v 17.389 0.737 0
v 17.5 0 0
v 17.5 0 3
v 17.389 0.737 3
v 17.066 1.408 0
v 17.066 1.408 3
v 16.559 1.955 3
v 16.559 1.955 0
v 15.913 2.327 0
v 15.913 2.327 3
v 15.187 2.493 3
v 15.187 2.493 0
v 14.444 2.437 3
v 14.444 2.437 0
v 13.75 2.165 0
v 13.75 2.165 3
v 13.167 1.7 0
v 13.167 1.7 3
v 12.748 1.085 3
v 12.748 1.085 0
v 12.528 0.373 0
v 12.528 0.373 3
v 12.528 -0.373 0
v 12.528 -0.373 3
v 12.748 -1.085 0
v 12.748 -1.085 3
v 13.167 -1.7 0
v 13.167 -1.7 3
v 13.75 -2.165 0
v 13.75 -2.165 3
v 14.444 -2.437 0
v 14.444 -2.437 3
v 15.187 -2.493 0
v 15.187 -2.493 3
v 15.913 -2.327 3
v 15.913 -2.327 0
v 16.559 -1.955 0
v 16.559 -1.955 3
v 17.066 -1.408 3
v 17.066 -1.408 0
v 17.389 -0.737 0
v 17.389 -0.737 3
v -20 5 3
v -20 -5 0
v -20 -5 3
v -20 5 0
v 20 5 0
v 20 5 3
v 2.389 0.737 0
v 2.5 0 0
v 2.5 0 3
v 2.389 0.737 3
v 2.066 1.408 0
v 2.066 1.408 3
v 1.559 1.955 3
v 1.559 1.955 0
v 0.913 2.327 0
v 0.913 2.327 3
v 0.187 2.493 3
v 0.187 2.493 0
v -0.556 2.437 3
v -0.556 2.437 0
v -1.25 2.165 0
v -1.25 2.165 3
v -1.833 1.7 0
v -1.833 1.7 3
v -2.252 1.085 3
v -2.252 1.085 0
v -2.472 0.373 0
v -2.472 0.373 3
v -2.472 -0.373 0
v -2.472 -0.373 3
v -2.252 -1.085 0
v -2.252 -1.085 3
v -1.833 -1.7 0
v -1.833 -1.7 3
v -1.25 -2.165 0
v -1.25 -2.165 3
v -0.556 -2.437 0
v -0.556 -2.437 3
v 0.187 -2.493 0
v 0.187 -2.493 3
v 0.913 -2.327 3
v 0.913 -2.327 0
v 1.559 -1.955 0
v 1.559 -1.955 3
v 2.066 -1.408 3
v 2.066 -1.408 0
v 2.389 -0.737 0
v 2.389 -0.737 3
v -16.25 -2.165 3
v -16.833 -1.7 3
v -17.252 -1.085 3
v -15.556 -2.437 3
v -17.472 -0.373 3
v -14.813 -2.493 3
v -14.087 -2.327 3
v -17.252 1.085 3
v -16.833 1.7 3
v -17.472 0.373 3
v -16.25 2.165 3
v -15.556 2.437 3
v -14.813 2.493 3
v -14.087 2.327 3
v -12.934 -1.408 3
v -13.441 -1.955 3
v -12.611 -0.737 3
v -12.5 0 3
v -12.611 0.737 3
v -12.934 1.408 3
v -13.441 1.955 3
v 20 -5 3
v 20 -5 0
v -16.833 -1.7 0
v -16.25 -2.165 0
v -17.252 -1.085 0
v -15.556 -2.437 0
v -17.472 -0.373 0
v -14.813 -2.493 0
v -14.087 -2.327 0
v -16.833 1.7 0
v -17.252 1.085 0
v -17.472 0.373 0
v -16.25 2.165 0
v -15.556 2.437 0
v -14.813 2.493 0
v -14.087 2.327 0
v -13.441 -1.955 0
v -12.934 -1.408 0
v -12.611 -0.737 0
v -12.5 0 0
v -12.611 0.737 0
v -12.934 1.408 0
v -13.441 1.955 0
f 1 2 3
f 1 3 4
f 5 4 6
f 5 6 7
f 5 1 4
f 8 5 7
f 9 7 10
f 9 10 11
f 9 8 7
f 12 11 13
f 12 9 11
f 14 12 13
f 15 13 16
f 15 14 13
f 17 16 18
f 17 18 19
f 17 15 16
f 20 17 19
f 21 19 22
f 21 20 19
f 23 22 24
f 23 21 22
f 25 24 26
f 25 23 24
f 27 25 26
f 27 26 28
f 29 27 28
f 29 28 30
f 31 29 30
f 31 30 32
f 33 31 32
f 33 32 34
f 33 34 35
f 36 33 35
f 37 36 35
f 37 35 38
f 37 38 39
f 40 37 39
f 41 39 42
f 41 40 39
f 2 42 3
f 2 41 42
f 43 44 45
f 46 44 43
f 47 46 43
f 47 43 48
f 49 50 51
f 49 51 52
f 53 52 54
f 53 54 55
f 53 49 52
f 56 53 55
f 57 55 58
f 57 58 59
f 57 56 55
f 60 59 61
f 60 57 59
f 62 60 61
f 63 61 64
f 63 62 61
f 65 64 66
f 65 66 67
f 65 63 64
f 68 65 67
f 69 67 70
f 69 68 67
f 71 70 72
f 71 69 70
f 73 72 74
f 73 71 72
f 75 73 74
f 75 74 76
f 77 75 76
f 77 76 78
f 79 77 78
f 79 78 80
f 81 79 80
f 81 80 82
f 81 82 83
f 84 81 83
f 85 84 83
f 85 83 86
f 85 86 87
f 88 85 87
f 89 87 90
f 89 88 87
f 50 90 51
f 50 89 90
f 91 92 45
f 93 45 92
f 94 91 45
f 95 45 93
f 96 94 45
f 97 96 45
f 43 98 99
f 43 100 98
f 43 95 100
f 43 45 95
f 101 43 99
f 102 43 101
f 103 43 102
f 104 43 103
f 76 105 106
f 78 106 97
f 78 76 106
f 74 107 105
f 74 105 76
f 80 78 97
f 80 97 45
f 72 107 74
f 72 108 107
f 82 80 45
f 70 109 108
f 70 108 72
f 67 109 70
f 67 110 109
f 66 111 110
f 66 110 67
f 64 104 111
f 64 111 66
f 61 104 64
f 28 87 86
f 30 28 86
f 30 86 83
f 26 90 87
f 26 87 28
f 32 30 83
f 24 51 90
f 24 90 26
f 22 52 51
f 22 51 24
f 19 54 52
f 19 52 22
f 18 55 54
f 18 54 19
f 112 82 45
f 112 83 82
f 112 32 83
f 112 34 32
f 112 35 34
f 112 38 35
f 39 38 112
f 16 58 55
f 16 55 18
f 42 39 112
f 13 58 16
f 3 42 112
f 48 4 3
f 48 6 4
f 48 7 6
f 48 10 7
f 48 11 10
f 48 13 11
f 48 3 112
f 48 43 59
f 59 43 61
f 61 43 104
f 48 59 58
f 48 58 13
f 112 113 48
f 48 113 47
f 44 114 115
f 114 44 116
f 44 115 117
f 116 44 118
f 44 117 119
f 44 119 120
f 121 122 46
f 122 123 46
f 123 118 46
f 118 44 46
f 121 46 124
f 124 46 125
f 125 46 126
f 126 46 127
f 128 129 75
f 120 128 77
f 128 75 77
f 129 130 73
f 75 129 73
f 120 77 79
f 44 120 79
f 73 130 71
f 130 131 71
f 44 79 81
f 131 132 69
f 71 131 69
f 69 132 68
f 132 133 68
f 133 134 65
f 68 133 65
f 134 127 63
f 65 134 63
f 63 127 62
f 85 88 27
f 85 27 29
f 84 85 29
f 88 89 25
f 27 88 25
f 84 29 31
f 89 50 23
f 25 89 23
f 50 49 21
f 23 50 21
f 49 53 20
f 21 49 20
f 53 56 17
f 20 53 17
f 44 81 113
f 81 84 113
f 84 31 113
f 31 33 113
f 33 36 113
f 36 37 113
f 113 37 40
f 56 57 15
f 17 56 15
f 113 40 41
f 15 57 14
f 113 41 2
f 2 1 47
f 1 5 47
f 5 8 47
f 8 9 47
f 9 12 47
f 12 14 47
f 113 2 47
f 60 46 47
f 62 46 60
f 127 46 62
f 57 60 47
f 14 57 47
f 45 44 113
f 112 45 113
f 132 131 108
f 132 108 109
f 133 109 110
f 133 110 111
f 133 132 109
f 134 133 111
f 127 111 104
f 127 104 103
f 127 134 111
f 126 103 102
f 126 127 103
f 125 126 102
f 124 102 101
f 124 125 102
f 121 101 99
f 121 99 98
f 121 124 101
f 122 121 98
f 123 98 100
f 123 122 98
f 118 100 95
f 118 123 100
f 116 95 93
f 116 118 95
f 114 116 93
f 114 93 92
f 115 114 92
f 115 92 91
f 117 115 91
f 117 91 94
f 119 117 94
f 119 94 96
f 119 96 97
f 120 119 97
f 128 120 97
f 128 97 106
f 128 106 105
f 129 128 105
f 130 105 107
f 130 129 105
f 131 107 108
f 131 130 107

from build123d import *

# Parameters (mm, degrees)
SKETCH_1_W      = 40
SKETCH_1_H      = 10
SKETCH_1_R      = 2.5
EXTRUDE_1_DEPTH = 3


with BuildPart() as part:
    # 草圖1 → 填料-伸長1 (new body)
    with BuildSketch(Plane.XY):
        Rectangle(SKETCH_1_W, SKETCH_1_H)
        with Locations((-15, 0)):
            Circle(SKETCH_1_R, mode=Mode.SUBTRACT)
        with Locations((15, 0)):
            Circle(SKETCH_1_R, mode=Mode.SUBTRACT)
        Circle(SKETCH_1_R, mode=Mode.SUBTRACT)
    extrude(amount=EXTRUDE_1_DEPTH)


solid = part.part
